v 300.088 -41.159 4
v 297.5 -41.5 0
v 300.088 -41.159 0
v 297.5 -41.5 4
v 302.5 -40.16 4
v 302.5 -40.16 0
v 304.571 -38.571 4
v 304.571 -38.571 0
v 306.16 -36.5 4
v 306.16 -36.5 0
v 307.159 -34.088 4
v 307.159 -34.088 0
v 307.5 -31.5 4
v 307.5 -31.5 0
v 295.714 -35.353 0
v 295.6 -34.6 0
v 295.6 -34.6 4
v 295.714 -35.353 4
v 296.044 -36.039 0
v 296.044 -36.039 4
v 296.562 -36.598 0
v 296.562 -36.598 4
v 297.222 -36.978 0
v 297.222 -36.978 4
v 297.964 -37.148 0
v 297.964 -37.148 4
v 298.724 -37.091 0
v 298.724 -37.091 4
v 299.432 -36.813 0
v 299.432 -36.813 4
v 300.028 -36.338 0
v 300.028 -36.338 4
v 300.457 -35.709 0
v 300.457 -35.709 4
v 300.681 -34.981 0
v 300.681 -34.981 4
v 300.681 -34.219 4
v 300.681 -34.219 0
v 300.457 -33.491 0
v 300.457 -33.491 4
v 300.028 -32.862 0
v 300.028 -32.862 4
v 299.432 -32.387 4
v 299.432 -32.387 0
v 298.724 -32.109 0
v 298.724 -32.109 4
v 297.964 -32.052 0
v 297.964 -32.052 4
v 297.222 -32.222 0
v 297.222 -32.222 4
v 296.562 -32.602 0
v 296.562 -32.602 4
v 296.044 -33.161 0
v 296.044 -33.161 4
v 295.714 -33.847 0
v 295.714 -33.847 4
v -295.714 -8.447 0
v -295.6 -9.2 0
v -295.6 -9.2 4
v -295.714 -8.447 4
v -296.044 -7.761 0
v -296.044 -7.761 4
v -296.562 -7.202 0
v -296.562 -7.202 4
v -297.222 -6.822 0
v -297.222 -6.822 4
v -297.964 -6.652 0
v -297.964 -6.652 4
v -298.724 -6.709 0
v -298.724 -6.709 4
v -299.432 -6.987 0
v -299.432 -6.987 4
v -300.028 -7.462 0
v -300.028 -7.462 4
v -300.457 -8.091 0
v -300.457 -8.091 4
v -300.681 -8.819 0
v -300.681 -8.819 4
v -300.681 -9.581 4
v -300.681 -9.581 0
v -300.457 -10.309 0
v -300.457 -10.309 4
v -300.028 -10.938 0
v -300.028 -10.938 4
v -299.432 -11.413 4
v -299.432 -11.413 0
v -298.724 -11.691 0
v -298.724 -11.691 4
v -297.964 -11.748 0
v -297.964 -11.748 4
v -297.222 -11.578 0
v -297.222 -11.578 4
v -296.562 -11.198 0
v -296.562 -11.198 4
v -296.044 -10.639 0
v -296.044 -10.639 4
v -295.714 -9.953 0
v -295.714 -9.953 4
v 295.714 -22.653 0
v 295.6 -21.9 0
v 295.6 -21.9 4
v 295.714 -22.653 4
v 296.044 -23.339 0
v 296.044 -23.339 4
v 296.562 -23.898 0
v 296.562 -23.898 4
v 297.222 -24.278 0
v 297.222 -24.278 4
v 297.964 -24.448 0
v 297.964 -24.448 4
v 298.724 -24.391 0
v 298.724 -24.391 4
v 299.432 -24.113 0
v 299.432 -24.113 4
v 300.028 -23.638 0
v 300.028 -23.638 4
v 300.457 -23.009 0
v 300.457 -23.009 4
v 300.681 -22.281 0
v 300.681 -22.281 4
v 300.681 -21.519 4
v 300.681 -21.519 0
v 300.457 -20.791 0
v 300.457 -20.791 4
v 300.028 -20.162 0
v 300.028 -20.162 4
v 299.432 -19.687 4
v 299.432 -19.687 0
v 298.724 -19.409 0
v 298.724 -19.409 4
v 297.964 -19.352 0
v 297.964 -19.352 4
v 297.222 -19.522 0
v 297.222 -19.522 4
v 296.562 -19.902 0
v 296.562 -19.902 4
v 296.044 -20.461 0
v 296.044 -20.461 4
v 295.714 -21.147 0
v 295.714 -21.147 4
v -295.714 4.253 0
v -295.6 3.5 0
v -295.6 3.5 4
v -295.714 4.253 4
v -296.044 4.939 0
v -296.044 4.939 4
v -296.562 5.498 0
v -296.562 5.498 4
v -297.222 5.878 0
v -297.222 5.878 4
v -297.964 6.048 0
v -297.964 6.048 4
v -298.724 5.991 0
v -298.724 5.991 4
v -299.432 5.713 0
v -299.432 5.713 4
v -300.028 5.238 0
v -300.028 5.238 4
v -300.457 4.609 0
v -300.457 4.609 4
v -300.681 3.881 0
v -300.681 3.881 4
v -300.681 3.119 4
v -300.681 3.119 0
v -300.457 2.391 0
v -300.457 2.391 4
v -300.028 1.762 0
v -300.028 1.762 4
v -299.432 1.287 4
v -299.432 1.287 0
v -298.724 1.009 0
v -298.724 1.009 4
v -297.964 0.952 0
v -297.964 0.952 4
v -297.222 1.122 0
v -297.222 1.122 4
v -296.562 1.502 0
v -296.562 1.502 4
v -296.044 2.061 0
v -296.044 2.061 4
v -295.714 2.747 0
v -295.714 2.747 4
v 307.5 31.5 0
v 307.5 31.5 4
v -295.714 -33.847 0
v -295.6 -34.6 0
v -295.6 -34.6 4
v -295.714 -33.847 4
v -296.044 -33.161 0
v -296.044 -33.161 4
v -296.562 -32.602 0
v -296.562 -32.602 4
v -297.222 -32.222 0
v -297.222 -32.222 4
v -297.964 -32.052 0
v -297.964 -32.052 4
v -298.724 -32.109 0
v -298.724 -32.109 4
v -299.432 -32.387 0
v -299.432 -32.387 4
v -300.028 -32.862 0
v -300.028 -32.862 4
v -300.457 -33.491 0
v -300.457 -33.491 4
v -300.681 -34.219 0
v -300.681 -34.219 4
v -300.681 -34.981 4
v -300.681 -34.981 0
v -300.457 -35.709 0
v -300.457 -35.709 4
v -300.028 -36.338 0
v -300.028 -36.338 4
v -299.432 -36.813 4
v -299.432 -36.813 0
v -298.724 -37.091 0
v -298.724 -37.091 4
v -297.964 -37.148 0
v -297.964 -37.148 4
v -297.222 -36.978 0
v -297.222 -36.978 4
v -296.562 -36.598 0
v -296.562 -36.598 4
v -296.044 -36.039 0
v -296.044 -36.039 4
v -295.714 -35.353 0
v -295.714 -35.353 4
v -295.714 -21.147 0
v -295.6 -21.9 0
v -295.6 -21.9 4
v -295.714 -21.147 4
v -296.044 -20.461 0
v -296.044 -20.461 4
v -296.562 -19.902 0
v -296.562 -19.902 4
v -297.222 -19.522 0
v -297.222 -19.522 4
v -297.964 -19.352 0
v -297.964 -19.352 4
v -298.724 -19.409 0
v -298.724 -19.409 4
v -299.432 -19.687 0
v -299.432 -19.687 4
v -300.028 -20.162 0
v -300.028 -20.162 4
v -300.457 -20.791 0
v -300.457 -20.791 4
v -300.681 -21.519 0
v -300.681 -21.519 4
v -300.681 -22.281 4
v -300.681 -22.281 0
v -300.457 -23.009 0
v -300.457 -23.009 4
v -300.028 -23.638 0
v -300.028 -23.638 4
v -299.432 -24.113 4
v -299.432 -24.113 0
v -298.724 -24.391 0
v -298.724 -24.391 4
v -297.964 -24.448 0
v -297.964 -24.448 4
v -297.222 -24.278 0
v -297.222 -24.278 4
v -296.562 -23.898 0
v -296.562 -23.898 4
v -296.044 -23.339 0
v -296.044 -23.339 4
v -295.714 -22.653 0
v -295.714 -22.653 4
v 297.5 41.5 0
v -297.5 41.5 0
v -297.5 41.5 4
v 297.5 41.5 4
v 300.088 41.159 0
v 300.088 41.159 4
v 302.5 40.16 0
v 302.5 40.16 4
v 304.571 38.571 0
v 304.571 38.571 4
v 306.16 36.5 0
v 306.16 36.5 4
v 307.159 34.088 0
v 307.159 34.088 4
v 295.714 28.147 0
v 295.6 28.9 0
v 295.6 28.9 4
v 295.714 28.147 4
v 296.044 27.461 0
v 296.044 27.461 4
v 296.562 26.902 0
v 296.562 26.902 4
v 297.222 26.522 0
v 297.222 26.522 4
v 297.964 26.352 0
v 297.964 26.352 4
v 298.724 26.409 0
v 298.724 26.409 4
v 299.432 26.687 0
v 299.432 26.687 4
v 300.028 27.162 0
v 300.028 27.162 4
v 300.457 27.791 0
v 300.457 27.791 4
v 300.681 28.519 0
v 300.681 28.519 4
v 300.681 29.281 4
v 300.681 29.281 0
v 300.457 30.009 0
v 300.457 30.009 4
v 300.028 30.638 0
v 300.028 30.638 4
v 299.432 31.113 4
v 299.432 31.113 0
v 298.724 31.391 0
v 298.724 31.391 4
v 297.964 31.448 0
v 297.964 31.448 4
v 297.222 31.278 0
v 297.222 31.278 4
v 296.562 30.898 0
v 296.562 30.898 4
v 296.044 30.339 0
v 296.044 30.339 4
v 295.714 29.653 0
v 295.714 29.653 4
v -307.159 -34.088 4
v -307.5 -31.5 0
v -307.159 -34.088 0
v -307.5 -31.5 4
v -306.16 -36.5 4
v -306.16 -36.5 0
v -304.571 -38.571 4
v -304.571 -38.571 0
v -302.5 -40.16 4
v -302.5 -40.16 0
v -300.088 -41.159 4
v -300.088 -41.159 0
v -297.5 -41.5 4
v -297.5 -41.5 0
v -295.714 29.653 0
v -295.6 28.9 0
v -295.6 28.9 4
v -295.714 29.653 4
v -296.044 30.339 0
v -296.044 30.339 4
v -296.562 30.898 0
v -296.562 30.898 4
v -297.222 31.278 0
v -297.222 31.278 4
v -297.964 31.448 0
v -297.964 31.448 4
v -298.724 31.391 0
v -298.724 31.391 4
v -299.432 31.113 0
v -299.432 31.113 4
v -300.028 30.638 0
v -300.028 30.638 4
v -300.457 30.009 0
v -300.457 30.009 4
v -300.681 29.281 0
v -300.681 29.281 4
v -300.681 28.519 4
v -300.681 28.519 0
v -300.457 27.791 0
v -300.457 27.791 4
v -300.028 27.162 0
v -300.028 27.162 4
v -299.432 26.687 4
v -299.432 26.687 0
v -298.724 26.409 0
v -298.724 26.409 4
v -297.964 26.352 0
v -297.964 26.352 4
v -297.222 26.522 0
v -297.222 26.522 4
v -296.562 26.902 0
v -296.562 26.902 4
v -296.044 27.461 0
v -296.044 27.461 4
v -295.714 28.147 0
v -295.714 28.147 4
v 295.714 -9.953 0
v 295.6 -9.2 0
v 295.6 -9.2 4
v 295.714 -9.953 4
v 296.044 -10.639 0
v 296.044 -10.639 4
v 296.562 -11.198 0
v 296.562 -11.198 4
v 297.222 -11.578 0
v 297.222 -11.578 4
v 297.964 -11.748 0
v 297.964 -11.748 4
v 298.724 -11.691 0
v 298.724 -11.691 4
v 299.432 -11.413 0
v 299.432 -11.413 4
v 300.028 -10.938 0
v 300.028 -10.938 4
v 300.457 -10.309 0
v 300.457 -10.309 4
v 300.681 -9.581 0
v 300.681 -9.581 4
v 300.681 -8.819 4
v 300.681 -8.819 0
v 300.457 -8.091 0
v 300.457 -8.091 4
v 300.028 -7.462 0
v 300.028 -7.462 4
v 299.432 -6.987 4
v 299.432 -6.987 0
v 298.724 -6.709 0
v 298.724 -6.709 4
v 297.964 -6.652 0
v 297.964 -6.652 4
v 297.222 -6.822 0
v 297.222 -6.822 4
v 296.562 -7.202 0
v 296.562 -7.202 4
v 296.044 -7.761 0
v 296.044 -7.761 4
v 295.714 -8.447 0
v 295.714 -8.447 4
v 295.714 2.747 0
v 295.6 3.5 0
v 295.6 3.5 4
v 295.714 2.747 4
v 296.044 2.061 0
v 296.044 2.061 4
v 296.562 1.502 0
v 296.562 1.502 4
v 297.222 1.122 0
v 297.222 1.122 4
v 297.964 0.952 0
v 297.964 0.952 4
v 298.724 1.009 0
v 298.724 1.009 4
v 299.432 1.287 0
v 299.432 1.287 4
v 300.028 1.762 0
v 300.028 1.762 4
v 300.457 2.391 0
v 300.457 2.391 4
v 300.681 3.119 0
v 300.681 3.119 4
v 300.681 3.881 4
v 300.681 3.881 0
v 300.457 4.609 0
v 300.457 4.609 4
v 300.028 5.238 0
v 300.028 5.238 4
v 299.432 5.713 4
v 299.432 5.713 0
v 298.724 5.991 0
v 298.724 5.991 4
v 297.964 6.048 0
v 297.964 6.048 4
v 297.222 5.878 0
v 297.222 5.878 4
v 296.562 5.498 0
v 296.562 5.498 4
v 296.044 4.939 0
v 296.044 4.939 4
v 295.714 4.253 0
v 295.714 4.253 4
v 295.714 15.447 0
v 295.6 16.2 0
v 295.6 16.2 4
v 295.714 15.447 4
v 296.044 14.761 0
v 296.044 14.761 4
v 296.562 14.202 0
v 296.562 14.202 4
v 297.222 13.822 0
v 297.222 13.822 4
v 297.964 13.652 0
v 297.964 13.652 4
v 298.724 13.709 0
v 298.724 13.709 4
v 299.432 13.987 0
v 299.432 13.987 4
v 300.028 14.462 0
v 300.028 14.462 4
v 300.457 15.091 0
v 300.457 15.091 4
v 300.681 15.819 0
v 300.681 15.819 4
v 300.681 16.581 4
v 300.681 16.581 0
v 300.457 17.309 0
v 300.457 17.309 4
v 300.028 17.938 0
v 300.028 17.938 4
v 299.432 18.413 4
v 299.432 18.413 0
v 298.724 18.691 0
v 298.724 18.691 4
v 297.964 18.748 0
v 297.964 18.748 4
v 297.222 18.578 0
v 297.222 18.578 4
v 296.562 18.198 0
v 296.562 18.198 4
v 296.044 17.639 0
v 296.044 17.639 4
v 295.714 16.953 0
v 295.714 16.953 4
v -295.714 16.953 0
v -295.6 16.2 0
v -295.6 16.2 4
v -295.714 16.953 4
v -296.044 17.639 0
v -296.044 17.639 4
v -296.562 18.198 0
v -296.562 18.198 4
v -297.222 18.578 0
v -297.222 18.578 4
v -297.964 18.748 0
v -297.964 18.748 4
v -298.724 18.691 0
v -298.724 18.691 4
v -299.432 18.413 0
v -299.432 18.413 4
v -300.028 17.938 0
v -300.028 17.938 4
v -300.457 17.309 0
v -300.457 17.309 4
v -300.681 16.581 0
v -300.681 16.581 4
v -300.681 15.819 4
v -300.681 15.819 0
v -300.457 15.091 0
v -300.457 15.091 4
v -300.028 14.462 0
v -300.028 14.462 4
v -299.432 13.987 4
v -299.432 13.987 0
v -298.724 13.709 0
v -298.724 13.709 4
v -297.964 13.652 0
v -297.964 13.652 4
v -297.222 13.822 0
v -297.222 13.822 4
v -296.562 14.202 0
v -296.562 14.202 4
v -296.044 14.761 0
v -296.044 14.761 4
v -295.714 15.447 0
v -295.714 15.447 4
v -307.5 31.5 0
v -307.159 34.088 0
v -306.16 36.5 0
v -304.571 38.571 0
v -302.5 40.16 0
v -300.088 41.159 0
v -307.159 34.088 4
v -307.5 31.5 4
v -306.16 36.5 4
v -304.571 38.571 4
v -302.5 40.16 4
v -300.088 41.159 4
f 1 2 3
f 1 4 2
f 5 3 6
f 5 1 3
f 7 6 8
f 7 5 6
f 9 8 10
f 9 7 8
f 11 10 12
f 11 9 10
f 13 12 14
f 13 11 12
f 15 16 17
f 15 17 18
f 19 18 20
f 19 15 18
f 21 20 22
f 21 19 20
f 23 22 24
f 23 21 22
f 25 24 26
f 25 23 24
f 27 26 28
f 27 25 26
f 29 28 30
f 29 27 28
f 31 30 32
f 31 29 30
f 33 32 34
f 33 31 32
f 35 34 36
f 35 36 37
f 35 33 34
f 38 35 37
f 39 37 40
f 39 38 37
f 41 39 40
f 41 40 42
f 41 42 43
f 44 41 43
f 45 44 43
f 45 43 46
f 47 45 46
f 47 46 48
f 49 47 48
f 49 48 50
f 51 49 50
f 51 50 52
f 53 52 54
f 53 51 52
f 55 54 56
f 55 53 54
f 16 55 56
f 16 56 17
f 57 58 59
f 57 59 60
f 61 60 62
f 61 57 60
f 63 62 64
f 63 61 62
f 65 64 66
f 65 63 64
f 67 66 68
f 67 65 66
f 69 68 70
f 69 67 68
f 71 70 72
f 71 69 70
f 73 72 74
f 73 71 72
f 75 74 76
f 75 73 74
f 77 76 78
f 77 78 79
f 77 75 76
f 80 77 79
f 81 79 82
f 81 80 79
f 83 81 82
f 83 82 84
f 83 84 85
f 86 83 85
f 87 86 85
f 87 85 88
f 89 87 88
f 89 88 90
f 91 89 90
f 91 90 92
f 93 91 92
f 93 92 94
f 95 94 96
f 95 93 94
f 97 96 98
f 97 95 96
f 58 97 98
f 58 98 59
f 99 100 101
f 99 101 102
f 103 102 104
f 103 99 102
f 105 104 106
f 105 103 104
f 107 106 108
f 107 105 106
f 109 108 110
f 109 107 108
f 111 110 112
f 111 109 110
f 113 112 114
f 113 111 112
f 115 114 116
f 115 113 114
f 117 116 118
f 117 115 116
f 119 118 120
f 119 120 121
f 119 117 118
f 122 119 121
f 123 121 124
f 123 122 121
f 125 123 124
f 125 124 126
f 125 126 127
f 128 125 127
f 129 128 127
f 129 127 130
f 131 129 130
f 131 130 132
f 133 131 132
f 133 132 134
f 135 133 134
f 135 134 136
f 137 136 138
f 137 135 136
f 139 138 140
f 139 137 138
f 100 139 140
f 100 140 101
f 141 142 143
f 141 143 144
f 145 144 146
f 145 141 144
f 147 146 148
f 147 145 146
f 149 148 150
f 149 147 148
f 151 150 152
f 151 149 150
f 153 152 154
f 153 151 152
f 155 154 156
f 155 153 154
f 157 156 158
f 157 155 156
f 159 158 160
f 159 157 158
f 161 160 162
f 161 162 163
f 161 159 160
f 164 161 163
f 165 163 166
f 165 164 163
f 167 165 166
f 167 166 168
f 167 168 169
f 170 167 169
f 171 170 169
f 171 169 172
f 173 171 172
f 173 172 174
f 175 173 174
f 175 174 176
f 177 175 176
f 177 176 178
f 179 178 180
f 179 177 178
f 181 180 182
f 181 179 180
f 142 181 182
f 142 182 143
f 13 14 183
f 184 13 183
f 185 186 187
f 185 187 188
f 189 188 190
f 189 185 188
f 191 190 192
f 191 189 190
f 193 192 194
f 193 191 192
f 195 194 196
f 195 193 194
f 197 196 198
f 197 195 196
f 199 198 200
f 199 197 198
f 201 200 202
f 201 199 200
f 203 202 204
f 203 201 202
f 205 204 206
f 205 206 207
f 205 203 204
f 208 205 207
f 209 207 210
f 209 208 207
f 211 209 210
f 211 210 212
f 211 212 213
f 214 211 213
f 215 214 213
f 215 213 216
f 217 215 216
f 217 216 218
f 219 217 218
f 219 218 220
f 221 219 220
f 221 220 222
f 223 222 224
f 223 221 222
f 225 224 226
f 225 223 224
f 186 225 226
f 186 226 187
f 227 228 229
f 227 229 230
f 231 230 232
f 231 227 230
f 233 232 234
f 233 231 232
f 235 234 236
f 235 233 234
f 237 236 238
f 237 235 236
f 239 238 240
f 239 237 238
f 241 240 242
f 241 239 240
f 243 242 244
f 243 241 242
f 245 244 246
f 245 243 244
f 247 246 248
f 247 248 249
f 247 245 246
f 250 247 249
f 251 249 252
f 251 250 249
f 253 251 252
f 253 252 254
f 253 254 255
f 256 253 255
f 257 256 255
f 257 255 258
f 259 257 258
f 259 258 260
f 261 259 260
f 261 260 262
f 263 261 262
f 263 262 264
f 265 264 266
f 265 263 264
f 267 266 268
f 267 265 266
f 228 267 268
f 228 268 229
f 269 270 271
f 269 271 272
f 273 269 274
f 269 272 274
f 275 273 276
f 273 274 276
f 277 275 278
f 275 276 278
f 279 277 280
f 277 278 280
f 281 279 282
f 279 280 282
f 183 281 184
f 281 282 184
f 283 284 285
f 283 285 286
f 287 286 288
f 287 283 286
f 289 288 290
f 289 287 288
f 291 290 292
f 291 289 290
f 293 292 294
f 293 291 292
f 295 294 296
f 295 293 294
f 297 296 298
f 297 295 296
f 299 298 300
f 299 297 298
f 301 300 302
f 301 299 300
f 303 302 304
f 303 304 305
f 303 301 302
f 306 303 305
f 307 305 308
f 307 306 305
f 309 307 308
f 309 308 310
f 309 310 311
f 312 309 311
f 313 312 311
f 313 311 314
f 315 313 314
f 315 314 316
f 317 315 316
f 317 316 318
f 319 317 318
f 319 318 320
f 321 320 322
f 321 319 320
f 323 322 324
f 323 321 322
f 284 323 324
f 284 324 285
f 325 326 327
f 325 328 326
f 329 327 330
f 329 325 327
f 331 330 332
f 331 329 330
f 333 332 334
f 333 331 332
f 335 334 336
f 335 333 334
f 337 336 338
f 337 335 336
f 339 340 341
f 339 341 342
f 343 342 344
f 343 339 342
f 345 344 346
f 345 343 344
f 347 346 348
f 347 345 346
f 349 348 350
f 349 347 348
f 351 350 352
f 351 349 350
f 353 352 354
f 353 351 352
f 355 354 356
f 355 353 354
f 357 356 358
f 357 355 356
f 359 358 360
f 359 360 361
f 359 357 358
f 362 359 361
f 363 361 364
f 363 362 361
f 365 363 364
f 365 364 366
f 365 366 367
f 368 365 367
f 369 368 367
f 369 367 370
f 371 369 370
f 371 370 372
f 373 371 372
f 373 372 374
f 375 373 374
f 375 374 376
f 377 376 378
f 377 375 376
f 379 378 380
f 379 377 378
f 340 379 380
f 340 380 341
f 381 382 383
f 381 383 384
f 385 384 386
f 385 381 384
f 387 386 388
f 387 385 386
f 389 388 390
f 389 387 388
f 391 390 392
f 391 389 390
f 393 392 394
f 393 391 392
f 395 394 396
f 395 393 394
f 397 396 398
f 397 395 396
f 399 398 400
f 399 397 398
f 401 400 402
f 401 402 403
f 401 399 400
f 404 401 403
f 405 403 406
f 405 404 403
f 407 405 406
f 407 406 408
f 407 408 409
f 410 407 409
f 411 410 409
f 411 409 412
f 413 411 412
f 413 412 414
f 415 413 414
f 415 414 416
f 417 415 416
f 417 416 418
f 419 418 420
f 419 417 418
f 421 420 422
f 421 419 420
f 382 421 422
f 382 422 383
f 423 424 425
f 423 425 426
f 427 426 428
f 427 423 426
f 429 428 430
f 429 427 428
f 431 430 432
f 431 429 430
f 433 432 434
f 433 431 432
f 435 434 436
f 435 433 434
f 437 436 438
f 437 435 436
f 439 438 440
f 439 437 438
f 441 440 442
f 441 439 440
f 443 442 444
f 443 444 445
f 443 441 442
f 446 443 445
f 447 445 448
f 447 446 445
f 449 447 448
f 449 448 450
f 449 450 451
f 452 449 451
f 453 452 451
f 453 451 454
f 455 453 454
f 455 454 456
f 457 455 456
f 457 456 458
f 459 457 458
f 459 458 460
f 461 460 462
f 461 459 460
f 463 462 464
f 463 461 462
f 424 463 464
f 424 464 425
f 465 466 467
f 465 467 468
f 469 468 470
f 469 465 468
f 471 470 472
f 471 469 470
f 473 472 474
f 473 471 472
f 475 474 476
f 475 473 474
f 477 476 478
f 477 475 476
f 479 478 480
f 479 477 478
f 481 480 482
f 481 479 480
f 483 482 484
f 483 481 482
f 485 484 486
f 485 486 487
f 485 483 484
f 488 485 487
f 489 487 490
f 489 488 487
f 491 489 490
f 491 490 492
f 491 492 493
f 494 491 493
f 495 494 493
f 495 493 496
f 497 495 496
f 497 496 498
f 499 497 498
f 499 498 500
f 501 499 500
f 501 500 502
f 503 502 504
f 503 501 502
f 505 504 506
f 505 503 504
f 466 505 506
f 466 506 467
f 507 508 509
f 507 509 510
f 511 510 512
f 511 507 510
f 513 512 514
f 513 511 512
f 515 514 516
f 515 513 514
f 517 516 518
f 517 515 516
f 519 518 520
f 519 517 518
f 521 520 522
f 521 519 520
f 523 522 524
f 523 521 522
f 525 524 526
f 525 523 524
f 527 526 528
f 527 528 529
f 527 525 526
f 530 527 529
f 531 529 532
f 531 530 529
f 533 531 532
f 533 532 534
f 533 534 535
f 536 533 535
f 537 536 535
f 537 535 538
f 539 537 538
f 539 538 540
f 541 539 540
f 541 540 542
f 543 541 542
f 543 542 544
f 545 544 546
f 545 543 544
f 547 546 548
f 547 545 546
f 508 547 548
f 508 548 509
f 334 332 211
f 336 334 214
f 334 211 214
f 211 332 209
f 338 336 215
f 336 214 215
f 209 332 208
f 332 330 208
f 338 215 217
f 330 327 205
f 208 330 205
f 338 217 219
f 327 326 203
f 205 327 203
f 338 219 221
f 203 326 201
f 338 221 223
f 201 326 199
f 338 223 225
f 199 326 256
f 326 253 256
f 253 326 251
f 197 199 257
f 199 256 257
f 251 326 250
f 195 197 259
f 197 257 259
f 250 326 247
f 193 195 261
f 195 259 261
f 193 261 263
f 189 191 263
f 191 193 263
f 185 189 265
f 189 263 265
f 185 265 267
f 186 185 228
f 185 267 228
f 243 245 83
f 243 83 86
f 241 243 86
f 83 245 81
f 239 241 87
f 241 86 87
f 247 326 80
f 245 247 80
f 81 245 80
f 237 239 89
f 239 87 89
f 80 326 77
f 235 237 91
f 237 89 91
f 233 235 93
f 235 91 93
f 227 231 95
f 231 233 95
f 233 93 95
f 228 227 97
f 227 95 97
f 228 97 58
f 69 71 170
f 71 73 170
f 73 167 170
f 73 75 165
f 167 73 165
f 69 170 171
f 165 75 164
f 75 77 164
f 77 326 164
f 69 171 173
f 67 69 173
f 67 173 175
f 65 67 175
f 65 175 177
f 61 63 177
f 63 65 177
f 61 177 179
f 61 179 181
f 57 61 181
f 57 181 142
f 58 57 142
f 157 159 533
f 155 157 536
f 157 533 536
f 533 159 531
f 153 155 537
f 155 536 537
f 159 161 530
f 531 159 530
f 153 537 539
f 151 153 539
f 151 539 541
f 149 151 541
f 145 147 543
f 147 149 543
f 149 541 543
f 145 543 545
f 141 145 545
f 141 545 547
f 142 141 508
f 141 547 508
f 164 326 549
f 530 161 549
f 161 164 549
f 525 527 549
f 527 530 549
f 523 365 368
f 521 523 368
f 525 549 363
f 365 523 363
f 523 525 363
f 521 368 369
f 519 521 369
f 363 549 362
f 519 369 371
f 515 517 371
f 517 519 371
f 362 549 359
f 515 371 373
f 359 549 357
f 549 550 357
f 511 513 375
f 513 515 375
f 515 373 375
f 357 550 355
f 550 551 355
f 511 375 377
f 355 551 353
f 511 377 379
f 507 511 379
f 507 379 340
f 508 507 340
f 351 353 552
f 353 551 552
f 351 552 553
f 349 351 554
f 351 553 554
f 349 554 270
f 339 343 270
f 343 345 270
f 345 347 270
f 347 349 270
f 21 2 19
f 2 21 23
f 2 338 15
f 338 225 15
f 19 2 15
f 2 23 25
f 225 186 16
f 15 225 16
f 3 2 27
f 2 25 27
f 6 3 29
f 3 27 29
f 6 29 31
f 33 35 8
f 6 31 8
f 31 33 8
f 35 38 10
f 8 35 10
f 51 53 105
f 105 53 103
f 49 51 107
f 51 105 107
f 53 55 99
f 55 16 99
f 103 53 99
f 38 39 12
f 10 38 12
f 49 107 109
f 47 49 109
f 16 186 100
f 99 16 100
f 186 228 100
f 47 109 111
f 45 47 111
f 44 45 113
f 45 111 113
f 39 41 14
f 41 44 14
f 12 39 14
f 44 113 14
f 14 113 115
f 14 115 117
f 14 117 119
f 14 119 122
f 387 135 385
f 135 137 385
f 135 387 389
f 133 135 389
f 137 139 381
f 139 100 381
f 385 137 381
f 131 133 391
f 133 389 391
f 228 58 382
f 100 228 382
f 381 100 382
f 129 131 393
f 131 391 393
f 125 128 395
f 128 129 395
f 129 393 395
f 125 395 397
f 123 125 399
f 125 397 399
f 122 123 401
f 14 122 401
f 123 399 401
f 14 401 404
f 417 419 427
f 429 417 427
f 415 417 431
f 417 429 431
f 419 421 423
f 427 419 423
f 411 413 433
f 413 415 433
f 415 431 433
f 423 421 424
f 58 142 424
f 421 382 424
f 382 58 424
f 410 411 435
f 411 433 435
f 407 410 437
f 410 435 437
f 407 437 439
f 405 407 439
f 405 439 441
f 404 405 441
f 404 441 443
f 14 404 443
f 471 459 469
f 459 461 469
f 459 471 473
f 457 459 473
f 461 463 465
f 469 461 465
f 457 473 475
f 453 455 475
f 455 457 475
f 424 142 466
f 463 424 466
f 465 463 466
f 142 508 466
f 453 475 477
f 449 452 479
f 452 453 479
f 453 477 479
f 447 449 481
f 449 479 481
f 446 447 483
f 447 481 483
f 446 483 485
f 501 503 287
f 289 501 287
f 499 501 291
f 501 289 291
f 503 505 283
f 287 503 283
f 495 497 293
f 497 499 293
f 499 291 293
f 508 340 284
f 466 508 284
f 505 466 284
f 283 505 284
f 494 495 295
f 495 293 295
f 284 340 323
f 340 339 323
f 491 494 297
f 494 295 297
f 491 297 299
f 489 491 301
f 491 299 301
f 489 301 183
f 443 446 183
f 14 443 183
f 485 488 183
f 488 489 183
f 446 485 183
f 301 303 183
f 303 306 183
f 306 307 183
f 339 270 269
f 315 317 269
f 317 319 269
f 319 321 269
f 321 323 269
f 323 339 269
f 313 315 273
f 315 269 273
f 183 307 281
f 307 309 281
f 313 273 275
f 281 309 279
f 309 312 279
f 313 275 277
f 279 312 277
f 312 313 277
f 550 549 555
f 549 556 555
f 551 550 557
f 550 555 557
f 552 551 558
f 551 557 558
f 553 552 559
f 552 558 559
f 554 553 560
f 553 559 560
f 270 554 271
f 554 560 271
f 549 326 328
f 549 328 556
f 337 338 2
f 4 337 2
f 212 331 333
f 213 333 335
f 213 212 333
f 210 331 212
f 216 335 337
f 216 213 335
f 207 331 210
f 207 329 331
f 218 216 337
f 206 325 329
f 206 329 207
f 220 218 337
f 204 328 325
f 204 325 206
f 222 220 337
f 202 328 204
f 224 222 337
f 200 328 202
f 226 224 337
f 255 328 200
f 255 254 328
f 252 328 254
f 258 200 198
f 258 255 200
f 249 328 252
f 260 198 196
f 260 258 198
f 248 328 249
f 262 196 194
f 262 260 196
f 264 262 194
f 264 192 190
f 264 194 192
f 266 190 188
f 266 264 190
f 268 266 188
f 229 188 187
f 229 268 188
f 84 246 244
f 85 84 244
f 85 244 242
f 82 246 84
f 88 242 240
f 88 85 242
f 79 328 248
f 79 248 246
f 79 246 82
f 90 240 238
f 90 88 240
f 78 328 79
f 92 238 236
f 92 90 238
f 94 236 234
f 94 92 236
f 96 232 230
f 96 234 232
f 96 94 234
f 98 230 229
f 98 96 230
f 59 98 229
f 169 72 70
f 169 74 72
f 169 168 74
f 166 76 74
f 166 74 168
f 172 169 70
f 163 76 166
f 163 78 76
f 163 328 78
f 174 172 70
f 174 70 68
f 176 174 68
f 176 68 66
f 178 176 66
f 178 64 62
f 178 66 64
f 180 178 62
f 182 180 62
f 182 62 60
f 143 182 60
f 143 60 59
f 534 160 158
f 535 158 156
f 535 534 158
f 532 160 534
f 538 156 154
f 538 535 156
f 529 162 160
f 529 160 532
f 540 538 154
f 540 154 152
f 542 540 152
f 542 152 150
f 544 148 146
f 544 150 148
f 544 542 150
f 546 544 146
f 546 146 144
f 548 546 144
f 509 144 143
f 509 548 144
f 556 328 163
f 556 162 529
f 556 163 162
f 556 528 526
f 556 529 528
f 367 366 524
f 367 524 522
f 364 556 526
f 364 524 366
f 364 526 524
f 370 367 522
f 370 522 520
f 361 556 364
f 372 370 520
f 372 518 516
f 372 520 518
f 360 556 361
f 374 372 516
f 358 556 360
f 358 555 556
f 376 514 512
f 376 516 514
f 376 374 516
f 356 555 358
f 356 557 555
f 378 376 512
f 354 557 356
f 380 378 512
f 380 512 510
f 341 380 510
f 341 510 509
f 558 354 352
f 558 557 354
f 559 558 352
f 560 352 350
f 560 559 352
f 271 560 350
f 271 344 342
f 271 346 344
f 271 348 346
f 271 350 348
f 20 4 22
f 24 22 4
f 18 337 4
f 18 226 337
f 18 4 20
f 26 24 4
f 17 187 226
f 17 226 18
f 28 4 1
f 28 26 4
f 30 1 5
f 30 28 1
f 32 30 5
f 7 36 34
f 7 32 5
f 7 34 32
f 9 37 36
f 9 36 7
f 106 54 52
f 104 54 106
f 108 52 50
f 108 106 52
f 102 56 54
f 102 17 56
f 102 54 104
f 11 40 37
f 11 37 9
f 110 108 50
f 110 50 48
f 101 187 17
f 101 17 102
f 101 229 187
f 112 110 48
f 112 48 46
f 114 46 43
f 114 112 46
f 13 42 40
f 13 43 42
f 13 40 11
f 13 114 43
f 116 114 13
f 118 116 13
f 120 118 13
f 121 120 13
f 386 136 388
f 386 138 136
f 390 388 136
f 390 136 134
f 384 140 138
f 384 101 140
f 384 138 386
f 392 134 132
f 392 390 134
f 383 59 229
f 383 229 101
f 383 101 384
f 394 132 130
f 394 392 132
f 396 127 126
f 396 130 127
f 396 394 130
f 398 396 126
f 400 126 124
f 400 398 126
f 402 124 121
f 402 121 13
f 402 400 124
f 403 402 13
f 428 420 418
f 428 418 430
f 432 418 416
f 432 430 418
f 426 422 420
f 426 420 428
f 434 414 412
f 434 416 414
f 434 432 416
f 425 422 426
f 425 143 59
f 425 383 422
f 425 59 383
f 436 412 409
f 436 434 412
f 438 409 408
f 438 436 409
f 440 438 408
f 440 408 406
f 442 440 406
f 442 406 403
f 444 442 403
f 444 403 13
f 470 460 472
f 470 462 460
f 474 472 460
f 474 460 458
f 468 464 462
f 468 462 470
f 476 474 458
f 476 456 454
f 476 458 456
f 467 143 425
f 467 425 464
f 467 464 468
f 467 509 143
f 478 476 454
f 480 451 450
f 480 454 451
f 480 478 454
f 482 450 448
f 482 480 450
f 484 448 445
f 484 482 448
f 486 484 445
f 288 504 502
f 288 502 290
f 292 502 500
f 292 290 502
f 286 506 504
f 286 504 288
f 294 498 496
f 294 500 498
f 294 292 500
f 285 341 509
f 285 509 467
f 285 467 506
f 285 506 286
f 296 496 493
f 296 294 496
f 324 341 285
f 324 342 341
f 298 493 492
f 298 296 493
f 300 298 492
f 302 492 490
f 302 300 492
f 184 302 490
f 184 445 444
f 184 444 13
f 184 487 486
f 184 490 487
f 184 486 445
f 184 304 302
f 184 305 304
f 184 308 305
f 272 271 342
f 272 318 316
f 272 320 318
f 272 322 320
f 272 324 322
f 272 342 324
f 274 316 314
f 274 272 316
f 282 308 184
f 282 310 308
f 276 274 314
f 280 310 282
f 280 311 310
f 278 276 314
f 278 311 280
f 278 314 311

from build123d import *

# Parameters (mm, degrees)
SKETCH_1_W      = 615
SKETCH_1_H      = 83
SKETCH_1_R      = 2.555
EXTRUDE_1_DEPTH = 4
FILLET_1_R      = 10


with BuildPart() as part:
    # 草图1 → 凸台-拉伸1 (new body)
    with BuildSketch(Plane.XY):
        Rectangle(SKETCH_1_W, SKETCH_1_H)
        with Locations((-298.155, -34.6)):
            Circle(SKETCH_1_R, mode=Mode.SUBTRACT)
        with Locations((-298.155, -21.9)):
            Circle(SKETCH_1_R, mode=Mode.SUBTRACT)
        with Locations((-298.155, -9.2)):
            Circle(SKETCH_1_R, mode=Mode.SUBTRACT)
        with Locations((-298.155, 3.5)):
            Circle(SKETCH_1_R, mode=Mode.SUBTRACT)
        with Locations((-298.155, 16.2)):
            Circle(SKETCH_1_R, mode=Mode.SUBTRACT)
        with Locations(Location((298.155, 16.2, 0), (0, 0, 180))):
            Circle(SKETCH_1_R, mode=Mode.SUBTRACT)
        with Locations(Location((298.155, 3.5, 0), (0, 0, 180))):
            Circle(SKETCH_1_R, mode=Mode.SUBTRACT)
        with Locations(Location((298.155, -9.2, 0), (0, 0, 180))):
            Circle(SKETCH_1_R, mode=Mode.SUBTRACT)
        with Locations(Location((298.155, -21.9, 0), (0, 0, 180))):
            Circle(SKETCH_1_R, mode=Mode.SUBTRACT)
        with Locations(Location((298.155, -34.6, 0), (0, 0, 180))):
            Circle(SKETCH_1_R, mode=Mode.SUBTRACT)
        with Locations((-298.155, 28.9)):
            Circle(SKETCH_1_R, mode=Mode.SUBTRACT)
        with Locations(Location((298.155, 28.9, 0), (0, 0, 180))):
            Circle(SKETCH_1_R, mode=Mode.SUBTRACT)
    extrude(amount=EXTRUDE_1_DEPTH)

    # 圆角1
    fillet_1_edges = [part.edges().sort_by_distance(p)[0] for p in [
        (307.5, -41.5, 2),
        (-307.5, -41.5, 2),
        (-307.5, 41.5, 2),
        (307.5, 41.5, 2),
    ]]
    fillet(fillet_1_edges, radius=FILLET_1_R)


solid = part.part
